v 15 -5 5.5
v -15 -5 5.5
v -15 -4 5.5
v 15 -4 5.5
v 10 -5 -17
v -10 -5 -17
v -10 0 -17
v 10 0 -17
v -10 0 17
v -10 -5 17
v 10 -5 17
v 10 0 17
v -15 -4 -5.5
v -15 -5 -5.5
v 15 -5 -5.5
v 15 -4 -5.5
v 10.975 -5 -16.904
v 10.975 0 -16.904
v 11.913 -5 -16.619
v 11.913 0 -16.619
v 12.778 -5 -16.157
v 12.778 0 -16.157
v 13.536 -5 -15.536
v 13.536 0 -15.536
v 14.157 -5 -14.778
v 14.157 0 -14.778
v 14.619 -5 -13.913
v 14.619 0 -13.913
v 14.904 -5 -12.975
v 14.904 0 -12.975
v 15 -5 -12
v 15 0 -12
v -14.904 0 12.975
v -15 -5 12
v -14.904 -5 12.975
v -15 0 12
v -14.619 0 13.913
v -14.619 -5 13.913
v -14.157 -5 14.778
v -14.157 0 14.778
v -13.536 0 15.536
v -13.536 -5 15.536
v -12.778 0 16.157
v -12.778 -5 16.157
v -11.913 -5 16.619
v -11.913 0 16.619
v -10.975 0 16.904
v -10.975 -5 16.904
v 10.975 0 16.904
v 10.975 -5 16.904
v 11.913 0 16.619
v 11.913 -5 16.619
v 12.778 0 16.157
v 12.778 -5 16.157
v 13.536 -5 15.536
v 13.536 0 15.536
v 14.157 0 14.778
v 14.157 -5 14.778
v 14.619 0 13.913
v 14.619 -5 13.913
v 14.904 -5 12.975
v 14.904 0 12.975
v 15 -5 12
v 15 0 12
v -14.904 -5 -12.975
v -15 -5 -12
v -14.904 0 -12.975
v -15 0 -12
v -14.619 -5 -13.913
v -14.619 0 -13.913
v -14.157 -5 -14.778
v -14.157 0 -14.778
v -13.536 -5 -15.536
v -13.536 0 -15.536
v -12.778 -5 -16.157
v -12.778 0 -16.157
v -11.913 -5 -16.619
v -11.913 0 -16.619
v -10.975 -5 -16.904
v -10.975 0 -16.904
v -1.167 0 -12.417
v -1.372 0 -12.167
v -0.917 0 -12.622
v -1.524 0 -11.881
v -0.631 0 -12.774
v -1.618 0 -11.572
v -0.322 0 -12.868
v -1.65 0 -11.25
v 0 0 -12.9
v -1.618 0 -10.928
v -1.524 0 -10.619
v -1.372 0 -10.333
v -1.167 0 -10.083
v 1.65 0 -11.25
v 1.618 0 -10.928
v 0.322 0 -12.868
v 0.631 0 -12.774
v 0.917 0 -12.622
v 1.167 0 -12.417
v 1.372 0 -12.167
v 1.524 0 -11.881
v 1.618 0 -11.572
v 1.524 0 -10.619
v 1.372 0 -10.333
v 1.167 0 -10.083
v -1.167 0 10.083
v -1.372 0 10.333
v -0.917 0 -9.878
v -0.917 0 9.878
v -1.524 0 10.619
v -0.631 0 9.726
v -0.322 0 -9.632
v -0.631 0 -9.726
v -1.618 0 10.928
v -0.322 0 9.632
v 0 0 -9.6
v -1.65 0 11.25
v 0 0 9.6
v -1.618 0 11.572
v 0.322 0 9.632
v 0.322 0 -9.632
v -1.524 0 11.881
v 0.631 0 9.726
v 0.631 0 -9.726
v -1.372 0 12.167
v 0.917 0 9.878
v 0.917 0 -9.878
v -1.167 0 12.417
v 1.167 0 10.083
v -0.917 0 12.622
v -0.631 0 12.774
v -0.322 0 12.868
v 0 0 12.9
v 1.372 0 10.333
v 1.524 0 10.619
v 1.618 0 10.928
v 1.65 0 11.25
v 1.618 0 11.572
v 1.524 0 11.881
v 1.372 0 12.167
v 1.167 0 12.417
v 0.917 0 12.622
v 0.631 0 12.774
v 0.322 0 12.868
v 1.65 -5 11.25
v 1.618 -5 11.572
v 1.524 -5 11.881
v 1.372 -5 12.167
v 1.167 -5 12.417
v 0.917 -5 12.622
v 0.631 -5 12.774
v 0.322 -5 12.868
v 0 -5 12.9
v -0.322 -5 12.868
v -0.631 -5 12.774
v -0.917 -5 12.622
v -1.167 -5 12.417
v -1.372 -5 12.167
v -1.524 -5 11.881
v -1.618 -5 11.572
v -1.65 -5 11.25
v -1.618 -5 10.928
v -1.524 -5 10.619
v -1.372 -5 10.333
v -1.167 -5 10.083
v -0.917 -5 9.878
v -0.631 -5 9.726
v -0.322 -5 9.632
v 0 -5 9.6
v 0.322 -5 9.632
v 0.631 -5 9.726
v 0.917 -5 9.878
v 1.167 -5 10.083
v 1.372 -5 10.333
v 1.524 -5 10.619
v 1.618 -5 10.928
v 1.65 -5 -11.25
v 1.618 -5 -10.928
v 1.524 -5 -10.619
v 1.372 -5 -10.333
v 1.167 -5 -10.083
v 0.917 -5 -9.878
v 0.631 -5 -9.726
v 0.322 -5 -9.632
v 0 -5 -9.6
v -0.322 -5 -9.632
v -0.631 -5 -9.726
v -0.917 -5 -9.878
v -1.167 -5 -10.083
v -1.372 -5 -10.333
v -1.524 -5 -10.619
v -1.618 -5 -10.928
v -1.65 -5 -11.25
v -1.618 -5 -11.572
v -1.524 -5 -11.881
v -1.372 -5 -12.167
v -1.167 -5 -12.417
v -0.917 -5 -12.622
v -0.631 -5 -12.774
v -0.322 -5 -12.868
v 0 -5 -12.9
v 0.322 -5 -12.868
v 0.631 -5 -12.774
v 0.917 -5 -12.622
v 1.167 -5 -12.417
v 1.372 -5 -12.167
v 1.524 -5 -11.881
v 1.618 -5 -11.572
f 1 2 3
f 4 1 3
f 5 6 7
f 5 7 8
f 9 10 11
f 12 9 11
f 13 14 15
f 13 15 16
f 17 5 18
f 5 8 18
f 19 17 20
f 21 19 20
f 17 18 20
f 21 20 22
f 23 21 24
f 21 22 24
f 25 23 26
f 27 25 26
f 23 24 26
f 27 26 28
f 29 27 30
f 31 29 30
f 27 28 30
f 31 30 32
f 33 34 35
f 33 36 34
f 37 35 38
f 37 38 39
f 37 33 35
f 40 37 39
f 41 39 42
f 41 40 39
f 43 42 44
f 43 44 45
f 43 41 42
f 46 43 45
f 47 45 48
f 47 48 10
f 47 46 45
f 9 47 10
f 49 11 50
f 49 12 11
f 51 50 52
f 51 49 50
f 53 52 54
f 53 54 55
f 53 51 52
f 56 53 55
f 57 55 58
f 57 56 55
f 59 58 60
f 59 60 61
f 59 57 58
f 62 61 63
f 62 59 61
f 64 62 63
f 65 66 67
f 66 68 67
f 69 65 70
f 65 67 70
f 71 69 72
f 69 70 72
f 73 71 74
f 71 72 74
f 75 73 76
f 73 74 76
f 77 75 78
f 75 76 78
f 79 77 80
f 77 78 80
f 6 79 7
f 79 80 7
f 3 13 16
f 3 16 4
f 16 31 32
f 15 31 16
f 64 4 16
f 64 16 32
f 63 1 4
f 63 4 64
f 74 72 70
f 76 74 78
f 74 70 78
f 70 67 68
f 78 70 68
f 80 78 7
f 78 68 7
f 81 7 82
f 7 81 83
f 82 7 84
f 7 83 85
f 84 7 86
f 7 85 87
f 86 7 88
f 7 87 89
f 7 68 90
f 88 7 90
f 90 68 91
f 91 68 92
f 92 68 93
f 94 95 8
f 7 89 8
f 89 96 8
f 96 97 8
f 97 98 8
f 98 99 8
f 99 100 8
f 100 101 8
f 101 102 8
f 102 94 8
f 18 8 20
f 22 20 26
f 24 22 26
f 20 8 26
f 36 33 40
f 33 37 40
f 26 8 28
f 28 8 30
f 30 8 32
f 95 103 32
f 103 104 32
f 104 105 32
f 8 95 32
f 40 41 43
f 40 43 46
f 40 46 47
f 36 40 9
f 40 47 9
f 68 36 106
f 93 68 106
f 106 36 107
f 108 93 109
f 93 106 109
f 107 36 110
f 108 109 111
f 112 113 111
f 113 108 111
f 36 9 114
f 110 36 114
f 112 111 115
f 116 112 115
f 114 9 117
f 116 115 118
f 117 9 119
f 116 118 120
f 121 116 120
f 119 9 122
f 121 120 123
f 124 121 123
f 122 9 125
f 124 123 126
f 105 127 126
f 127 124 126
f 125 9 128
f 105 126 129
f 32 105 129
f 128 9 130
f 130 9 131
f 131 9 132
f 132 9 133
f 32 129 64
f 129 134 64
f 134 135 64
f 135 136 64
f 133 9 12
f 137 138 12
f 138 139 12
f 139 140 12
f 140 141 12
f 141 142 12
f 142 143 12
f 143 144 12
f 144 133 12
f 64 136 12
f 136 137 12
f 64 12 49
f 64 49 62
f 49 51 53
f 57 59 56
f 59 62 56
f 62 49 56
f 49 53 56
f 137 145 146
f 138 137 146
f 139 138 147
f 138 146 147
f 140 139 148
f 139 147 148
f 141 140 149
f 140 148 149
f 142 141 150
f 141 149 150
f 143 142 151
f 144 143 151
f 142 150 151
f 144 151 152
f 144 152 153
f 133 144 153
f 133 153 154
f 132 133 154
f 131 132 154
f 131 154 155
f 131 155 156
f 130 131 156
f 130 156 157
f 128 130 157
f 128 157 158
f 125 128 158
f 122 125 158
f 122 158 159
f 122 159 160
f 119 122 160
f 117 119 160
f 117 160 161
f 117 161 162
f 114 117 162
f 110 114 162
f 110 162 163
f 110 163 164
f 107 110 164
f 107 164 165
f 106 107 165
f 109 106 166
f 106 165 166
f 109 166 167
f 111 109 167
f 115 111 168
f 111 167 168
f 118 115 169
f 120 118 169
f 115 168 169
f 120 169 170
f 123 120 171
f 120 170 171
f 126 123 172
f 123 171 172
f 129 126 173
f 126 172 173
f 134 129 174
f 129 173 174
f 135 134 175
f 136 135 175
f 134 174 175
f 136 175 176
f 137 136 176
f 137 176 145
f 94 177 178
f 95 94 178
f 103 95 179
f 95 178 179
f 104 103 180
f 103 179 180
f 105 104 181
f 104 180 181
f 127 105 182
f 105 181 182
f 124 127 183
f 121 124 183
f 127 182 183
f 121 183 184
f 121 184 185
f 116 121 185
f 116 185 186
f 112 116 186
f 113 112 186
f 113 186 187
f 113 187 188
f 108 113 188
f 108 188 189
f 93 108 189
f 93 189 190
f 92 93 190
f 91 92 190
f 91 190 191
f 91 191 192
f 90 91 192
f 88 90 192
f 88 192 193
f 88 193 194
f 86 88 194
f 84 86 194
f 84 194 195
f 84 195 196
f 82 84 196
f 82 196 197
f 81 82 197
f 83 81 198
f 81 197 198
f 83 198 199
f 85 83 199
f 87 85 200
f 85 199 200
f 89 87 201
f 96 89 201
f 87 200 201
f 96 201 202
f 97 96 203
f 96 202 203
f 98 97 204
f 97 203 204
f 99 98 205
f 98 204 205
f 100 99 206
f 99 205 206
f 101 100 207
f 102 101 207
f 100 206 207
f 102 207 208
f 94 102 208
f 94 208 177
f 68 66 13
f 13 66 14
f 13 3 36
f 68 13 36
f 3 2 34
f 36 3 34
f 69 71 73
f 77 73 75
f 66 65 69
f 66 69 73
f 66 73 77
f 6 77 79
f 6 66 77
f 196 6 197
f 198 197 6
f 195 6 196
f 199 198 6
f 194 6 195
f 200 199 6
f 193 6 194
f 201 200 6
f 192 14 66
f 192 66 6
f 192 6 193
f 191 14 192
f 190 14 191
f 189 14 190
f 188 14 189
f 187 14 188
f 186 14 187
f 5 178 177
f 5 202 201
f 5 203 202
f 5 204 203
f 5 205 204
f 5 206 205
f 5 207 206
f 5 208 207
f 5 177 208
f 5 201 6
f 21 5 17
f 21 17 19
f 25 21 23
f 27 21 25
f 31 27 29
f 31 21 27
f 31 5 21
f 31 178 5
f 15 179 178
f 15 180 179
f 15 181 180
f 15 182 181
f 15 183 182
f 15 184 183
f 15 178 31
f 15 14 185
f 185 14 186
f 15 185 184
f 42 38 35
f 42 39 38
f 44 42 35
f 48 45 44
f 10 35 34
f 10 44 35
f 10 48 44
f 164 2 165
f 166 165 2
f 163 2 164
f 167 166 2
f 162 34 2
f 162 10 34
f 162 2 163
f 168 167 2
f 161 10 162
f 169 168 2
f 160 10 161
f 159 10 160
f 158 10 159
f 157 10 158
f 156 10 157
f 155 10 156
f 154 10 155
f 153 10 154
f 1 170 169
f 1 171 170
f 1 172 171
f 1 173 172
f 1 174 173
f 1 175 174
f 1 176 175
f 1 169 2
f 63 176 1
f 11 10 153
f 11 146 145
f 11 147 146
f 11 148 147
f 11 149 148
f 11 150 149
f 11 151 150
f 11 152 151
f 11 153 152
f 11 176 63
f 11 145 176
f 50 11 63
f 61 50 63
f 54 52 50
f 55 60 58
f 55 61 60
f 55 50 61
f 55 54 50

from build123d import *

# Parameters (mm, degrees)
SKETCH1_W           = 30
SKETCH1_H           = 34
BOSS_EXTRUDE1_DEPTH = 5
SKETCH2_W           = 11
SKETCH2_H           = 1
CUT_EXTRUDE1_DEPTH  = 31
FILLET1_R           = 5
SKETCH6_R           = 1.65
CUT_EXTRUDE2_DEPTH  = 6


with BuildPart() as part:
    # Sketch1 → Boss-Extrude1 (new body)
    with BuildSketch(Plane.XZ.offset(5)):
        Rectangle(SKETCH1_W, SKETCH1_H)
    extrude(amount=-BOSS_EXTRUDE1_DEPTH)

    # Sketch2 → Cut-Extrude1 (cut, through all)
    with BuildSketch(Plane.ZY.offset(15)):
        with Locations((0, -4.5)):
            Rectangle(SKETCH2_W, SKETCH2_H)
    extrude(amount=-CUT_EXTRUDE1_DEPTH, mode=Mode.SUBTRACT)

    # Fillet1
    fillet1_edges = [part.edges().sort_by_distance(p)[0] for p in [
        (15, -2.5, 17),
        (15, -2.5, -17),
        (-15, -2.5, -17),
        (-15, -2.5, 17),
    ]]
    fillet(fillet1_edges, radius=FILLET1_R)

    # Sketch6 → Cut-Extrude2 (cut, through all)
    with BuildSketch(Plane.XZ.offset(5)):
        with Locations((0, 11.25)):
            Circle(SKETCH6_R)
        with Locations((0, -11.25)):
            Circle(SKETCH6_R)
    extrude(amount=-CUT_EXTRUDE2_DEPTH, mode=Mode.SUBTRACT)


solid = part.part
